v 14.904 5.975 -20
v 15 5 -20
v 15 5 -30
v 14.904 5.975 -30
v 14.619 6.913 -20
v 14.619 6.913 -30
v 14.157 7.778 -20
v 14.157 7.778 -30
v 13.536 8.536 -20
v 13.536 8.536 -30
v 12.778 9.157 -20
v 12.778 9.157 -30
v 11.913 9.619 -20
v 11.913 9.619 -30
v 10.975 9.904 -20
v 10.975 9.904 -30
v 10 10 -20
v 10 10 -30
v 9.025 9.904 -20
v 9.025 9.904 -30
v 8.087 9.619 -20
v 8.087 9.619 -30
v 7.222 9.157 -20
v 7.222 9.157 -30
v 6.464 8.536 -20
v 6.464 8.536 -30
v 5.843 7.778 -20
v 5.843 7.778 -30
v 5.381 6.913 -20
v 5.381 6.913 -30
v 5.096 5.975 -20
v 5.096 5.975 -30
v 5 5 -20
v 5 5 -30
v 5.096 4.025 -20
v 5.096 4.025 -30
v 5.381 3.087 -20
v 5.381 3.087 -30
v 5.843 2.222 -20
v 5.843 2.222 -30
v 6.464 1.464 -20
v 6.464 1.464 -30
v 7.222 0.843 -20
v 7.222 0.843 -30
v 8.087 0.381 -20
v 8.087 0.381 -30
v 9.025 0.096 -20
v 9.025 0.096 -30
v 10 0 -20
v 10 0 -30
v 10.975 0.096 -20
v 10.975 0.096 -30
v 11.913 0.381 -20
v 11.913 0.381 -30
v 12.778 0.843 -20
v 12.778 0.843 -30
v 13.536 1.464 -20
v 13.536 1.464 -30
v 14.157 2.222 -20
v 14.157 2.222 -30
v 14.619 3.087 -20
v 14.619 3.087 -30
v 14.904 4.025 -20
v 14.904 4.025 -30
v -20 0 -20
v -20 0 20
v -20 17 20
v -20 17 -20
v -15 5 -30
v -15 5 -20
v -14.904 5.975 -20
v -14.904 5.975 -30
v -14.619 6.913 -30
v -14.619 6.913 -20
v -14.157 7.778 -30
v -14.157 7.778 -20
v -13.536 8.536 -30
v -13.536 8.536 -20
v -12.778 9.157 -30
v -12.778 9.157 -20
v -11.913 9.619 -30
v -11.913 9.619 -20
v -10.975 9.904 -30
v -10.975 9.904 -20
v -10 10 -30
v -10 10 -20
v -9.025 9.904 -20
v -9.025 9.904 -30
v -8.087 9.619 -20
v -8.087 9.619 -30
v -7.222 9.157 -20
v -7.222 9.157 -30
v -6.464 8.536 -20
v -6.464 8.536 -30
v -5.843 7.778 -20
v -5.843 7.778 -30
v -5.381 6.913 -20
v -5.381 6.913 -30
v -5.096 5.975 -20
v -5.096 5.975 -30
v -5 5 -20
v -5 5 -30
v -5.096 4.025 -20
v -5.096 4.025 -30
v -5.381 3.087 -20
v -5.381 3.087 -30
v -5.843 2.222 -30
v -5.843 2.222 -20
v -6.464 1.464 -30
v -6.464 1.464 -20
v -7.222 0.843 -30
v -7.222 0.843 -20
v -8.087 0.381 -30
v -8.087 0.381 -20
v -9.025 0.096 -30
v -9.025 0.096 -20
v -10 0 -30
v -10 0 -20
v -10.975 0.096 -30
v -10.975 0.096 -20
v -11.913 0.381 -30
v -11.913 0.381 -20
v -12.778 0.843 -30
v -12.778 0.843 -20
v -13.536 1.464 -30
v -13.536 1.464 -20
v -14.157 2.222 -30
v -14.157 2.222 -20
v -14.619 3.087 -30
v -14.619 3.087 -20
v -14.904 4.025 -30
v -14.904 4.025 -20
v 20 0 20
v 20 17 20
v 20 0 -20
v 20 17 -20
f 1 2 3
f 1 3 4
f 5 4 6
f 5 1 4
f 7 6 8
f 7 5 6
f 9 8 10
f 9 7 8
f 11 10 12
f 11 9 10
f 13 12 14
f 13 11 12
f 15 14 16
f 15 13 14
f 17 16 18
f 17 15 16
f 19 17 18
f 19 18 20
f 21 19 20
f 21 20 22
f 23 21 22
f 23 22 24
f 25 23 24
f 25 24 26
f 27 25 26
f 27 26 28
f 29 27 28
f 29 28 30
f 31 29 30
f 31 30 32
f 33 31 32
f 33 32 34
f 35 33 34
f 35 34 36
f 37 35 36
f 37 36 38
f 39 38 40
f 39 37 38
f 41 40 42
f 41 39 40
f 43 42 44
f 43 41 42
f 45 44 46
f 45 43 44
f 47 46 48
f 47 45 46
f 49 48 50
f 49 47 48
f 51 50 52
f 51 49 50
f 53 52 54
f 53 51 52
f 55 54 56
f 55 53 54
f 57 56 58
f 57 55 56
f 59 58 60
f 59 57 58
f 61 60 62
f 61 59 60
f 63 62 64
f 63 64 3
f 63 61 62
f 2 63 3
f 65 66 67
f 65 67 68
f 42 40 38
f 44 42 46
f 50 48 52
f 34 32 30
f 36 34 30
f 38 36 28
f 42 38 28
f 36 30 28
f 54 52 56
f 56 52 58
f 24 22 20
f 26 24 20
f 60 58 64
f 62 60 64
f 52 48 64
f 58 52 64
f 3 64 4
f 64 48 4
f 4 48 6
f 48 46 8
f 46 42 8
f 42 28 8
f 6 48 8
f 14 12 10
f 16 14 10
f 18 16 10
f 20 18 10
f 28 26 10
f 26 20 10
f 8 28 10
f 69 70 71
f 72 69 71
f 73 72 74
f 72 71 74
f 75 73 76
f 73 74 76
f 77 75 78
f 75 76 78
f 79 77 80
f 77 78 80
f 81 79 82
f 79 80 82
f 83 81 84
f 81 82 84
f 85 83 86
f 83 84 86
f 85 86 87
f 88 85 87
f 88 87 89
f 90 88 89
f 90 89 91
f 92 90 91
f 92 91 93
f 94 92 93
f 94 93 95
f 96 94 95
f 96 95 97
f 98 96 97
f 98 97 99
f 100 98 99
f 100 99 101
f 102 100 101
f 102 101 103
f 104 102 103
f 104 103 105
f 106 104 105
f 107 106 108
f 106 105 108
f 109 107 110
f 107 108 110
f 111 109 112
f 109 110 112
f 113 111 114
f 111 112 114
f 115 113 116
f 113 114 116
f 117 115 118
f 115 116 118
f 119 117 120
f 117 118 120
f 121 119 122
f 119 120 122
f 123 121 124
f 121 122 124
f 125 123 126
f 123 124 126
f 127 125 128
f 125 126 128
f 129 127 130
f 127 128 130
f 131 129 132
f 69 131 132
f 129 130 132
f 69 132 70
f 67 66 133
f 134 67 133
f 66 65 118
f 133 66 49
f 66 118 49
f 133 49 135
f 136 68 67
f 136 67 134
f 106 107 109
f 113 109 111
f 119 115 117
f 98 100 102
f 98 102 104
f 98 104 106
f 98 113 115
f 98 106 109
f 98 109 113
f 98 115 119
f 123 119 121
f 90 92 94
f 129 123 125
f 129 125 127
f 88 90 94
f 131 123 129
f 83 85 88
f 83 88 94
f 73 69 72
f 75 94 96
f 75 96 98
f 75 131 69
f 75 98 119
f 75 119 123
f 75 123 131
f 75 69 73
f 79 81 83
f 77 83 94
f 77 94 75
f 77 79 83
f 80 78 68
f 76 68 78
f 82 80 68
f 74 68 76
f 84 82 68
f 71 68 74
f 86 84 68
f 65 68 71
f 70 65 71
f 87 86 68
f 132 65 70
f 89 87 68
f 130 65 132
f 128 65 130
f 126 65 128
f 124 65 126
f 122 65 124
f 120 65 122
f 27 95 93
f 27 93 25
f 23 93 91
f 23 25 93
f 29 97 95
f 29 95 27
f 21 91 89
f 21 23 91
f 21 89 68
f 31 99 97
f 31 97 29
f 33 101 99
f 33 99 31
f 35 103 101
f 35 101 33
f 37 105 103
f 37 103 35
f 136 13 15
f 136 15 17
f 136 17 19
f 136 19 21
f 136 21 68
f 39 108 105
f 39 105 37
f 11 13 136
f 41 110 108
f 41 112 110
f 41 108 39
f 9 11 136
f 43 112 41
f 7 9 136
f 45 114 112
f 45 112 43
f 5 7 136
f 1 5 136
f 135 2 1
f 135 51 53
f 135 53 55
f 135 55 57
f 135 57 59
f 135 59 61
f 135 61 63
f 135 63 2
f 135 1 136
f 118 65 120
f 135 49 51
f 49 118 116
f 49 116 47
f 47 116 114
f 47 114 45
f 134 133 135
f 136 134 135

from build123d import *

# Parameters (mm, degrees)
SKETCH1_W           = 40
SKETCH1_H           = 40
BOSS_EXTRUDE1_DEPTH = 17
SKETCH2_R           = 5
BOSS_EXTRUDE2_DEPTH = 10


with BuildPart() as part:
    # Sketch1 → Boss-Extrude1 (new body)
    with BuildSketch(Plane(origin=(0, 0, 0), x_dir=(1, 0, 0), z_dir=(0, 1, 0))):
        Rectangle(SKETCH1_W, SKETCH1_H)
    extrude(amount=BOSS_EXTRUDE1_DEPTH)

    # Sketch2 → Boss-Extrude2 (add)
    with BuildSketch(Plane(origin=(0, 0, -20), x_dir=(-1, 0, 0), z_dir=(0, 0, -1))):
        with Locations((10, 5)):
            Circle(SKETCH2_R)
    boss_extrude2 = extrude(amount=BOSS_EXTRUDE2_DEPTH)

    # Mirror1: Boss-Extrude2 across plane
    add(boss_extrude2.mirror(Plane(origin=(0, 0, 0), x_dir=(0, 0, 1), z_dir=(1, 0, 0))))


solid = part.part
